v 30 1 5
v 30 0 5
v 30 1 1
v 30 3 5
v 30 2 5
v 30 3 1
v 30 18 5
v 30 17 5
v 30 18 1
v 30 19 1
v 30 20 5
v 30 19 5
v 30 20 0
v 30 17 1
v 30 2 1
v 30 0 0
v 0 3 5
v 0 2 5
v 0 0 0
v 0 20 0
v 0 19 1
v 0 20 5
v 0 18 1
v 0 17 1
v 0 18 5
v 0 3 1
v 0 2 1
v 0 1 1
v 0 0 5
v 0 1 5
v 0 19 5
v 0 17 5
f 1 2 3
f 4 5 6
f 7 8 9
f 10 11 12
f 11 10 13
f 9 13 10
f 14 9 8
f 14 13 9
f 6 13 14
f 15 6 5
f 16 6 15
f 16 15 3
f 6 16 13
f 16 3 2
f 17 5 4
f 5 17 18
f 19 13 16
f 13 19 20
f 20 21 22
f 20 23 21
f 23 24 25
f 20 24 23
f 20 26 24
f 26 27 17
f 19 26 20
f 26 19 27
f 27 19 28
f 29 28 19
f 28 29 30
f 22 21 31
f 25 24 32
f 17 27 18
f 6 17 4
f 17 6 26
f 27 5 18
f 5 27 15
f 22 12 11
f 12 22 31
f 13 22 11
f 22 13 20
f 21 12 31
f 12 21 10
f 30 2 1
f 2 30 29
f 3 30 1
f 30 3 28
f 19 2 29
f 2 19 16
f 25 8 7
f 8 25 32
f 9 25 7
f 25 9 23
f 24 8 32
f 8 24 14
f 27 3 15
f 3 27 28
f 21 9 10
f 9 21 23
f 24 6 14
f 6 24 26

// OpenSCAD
fin_width = 1;
fin_dist = 16;
fin_gap = 1;
fin_height = 5;
length = 30;

module fins()
{
    cube([length, fin_width, fin_height]);
    translate([0,fin_width + fin_dist,0]) cube([length, fin_width, fin_height]);
    
    translate([0,fin_width + fin_gap,0])
    {
        cube([length, fin_width, fin_height]);
        translate([0,fin_width + fin_dist,0]) cube([length, fin_width, fin_height]);
    }
    
}


fins();
cube([length, 2* fin_gap + fin_dist + 2* fin_width, 1]);
